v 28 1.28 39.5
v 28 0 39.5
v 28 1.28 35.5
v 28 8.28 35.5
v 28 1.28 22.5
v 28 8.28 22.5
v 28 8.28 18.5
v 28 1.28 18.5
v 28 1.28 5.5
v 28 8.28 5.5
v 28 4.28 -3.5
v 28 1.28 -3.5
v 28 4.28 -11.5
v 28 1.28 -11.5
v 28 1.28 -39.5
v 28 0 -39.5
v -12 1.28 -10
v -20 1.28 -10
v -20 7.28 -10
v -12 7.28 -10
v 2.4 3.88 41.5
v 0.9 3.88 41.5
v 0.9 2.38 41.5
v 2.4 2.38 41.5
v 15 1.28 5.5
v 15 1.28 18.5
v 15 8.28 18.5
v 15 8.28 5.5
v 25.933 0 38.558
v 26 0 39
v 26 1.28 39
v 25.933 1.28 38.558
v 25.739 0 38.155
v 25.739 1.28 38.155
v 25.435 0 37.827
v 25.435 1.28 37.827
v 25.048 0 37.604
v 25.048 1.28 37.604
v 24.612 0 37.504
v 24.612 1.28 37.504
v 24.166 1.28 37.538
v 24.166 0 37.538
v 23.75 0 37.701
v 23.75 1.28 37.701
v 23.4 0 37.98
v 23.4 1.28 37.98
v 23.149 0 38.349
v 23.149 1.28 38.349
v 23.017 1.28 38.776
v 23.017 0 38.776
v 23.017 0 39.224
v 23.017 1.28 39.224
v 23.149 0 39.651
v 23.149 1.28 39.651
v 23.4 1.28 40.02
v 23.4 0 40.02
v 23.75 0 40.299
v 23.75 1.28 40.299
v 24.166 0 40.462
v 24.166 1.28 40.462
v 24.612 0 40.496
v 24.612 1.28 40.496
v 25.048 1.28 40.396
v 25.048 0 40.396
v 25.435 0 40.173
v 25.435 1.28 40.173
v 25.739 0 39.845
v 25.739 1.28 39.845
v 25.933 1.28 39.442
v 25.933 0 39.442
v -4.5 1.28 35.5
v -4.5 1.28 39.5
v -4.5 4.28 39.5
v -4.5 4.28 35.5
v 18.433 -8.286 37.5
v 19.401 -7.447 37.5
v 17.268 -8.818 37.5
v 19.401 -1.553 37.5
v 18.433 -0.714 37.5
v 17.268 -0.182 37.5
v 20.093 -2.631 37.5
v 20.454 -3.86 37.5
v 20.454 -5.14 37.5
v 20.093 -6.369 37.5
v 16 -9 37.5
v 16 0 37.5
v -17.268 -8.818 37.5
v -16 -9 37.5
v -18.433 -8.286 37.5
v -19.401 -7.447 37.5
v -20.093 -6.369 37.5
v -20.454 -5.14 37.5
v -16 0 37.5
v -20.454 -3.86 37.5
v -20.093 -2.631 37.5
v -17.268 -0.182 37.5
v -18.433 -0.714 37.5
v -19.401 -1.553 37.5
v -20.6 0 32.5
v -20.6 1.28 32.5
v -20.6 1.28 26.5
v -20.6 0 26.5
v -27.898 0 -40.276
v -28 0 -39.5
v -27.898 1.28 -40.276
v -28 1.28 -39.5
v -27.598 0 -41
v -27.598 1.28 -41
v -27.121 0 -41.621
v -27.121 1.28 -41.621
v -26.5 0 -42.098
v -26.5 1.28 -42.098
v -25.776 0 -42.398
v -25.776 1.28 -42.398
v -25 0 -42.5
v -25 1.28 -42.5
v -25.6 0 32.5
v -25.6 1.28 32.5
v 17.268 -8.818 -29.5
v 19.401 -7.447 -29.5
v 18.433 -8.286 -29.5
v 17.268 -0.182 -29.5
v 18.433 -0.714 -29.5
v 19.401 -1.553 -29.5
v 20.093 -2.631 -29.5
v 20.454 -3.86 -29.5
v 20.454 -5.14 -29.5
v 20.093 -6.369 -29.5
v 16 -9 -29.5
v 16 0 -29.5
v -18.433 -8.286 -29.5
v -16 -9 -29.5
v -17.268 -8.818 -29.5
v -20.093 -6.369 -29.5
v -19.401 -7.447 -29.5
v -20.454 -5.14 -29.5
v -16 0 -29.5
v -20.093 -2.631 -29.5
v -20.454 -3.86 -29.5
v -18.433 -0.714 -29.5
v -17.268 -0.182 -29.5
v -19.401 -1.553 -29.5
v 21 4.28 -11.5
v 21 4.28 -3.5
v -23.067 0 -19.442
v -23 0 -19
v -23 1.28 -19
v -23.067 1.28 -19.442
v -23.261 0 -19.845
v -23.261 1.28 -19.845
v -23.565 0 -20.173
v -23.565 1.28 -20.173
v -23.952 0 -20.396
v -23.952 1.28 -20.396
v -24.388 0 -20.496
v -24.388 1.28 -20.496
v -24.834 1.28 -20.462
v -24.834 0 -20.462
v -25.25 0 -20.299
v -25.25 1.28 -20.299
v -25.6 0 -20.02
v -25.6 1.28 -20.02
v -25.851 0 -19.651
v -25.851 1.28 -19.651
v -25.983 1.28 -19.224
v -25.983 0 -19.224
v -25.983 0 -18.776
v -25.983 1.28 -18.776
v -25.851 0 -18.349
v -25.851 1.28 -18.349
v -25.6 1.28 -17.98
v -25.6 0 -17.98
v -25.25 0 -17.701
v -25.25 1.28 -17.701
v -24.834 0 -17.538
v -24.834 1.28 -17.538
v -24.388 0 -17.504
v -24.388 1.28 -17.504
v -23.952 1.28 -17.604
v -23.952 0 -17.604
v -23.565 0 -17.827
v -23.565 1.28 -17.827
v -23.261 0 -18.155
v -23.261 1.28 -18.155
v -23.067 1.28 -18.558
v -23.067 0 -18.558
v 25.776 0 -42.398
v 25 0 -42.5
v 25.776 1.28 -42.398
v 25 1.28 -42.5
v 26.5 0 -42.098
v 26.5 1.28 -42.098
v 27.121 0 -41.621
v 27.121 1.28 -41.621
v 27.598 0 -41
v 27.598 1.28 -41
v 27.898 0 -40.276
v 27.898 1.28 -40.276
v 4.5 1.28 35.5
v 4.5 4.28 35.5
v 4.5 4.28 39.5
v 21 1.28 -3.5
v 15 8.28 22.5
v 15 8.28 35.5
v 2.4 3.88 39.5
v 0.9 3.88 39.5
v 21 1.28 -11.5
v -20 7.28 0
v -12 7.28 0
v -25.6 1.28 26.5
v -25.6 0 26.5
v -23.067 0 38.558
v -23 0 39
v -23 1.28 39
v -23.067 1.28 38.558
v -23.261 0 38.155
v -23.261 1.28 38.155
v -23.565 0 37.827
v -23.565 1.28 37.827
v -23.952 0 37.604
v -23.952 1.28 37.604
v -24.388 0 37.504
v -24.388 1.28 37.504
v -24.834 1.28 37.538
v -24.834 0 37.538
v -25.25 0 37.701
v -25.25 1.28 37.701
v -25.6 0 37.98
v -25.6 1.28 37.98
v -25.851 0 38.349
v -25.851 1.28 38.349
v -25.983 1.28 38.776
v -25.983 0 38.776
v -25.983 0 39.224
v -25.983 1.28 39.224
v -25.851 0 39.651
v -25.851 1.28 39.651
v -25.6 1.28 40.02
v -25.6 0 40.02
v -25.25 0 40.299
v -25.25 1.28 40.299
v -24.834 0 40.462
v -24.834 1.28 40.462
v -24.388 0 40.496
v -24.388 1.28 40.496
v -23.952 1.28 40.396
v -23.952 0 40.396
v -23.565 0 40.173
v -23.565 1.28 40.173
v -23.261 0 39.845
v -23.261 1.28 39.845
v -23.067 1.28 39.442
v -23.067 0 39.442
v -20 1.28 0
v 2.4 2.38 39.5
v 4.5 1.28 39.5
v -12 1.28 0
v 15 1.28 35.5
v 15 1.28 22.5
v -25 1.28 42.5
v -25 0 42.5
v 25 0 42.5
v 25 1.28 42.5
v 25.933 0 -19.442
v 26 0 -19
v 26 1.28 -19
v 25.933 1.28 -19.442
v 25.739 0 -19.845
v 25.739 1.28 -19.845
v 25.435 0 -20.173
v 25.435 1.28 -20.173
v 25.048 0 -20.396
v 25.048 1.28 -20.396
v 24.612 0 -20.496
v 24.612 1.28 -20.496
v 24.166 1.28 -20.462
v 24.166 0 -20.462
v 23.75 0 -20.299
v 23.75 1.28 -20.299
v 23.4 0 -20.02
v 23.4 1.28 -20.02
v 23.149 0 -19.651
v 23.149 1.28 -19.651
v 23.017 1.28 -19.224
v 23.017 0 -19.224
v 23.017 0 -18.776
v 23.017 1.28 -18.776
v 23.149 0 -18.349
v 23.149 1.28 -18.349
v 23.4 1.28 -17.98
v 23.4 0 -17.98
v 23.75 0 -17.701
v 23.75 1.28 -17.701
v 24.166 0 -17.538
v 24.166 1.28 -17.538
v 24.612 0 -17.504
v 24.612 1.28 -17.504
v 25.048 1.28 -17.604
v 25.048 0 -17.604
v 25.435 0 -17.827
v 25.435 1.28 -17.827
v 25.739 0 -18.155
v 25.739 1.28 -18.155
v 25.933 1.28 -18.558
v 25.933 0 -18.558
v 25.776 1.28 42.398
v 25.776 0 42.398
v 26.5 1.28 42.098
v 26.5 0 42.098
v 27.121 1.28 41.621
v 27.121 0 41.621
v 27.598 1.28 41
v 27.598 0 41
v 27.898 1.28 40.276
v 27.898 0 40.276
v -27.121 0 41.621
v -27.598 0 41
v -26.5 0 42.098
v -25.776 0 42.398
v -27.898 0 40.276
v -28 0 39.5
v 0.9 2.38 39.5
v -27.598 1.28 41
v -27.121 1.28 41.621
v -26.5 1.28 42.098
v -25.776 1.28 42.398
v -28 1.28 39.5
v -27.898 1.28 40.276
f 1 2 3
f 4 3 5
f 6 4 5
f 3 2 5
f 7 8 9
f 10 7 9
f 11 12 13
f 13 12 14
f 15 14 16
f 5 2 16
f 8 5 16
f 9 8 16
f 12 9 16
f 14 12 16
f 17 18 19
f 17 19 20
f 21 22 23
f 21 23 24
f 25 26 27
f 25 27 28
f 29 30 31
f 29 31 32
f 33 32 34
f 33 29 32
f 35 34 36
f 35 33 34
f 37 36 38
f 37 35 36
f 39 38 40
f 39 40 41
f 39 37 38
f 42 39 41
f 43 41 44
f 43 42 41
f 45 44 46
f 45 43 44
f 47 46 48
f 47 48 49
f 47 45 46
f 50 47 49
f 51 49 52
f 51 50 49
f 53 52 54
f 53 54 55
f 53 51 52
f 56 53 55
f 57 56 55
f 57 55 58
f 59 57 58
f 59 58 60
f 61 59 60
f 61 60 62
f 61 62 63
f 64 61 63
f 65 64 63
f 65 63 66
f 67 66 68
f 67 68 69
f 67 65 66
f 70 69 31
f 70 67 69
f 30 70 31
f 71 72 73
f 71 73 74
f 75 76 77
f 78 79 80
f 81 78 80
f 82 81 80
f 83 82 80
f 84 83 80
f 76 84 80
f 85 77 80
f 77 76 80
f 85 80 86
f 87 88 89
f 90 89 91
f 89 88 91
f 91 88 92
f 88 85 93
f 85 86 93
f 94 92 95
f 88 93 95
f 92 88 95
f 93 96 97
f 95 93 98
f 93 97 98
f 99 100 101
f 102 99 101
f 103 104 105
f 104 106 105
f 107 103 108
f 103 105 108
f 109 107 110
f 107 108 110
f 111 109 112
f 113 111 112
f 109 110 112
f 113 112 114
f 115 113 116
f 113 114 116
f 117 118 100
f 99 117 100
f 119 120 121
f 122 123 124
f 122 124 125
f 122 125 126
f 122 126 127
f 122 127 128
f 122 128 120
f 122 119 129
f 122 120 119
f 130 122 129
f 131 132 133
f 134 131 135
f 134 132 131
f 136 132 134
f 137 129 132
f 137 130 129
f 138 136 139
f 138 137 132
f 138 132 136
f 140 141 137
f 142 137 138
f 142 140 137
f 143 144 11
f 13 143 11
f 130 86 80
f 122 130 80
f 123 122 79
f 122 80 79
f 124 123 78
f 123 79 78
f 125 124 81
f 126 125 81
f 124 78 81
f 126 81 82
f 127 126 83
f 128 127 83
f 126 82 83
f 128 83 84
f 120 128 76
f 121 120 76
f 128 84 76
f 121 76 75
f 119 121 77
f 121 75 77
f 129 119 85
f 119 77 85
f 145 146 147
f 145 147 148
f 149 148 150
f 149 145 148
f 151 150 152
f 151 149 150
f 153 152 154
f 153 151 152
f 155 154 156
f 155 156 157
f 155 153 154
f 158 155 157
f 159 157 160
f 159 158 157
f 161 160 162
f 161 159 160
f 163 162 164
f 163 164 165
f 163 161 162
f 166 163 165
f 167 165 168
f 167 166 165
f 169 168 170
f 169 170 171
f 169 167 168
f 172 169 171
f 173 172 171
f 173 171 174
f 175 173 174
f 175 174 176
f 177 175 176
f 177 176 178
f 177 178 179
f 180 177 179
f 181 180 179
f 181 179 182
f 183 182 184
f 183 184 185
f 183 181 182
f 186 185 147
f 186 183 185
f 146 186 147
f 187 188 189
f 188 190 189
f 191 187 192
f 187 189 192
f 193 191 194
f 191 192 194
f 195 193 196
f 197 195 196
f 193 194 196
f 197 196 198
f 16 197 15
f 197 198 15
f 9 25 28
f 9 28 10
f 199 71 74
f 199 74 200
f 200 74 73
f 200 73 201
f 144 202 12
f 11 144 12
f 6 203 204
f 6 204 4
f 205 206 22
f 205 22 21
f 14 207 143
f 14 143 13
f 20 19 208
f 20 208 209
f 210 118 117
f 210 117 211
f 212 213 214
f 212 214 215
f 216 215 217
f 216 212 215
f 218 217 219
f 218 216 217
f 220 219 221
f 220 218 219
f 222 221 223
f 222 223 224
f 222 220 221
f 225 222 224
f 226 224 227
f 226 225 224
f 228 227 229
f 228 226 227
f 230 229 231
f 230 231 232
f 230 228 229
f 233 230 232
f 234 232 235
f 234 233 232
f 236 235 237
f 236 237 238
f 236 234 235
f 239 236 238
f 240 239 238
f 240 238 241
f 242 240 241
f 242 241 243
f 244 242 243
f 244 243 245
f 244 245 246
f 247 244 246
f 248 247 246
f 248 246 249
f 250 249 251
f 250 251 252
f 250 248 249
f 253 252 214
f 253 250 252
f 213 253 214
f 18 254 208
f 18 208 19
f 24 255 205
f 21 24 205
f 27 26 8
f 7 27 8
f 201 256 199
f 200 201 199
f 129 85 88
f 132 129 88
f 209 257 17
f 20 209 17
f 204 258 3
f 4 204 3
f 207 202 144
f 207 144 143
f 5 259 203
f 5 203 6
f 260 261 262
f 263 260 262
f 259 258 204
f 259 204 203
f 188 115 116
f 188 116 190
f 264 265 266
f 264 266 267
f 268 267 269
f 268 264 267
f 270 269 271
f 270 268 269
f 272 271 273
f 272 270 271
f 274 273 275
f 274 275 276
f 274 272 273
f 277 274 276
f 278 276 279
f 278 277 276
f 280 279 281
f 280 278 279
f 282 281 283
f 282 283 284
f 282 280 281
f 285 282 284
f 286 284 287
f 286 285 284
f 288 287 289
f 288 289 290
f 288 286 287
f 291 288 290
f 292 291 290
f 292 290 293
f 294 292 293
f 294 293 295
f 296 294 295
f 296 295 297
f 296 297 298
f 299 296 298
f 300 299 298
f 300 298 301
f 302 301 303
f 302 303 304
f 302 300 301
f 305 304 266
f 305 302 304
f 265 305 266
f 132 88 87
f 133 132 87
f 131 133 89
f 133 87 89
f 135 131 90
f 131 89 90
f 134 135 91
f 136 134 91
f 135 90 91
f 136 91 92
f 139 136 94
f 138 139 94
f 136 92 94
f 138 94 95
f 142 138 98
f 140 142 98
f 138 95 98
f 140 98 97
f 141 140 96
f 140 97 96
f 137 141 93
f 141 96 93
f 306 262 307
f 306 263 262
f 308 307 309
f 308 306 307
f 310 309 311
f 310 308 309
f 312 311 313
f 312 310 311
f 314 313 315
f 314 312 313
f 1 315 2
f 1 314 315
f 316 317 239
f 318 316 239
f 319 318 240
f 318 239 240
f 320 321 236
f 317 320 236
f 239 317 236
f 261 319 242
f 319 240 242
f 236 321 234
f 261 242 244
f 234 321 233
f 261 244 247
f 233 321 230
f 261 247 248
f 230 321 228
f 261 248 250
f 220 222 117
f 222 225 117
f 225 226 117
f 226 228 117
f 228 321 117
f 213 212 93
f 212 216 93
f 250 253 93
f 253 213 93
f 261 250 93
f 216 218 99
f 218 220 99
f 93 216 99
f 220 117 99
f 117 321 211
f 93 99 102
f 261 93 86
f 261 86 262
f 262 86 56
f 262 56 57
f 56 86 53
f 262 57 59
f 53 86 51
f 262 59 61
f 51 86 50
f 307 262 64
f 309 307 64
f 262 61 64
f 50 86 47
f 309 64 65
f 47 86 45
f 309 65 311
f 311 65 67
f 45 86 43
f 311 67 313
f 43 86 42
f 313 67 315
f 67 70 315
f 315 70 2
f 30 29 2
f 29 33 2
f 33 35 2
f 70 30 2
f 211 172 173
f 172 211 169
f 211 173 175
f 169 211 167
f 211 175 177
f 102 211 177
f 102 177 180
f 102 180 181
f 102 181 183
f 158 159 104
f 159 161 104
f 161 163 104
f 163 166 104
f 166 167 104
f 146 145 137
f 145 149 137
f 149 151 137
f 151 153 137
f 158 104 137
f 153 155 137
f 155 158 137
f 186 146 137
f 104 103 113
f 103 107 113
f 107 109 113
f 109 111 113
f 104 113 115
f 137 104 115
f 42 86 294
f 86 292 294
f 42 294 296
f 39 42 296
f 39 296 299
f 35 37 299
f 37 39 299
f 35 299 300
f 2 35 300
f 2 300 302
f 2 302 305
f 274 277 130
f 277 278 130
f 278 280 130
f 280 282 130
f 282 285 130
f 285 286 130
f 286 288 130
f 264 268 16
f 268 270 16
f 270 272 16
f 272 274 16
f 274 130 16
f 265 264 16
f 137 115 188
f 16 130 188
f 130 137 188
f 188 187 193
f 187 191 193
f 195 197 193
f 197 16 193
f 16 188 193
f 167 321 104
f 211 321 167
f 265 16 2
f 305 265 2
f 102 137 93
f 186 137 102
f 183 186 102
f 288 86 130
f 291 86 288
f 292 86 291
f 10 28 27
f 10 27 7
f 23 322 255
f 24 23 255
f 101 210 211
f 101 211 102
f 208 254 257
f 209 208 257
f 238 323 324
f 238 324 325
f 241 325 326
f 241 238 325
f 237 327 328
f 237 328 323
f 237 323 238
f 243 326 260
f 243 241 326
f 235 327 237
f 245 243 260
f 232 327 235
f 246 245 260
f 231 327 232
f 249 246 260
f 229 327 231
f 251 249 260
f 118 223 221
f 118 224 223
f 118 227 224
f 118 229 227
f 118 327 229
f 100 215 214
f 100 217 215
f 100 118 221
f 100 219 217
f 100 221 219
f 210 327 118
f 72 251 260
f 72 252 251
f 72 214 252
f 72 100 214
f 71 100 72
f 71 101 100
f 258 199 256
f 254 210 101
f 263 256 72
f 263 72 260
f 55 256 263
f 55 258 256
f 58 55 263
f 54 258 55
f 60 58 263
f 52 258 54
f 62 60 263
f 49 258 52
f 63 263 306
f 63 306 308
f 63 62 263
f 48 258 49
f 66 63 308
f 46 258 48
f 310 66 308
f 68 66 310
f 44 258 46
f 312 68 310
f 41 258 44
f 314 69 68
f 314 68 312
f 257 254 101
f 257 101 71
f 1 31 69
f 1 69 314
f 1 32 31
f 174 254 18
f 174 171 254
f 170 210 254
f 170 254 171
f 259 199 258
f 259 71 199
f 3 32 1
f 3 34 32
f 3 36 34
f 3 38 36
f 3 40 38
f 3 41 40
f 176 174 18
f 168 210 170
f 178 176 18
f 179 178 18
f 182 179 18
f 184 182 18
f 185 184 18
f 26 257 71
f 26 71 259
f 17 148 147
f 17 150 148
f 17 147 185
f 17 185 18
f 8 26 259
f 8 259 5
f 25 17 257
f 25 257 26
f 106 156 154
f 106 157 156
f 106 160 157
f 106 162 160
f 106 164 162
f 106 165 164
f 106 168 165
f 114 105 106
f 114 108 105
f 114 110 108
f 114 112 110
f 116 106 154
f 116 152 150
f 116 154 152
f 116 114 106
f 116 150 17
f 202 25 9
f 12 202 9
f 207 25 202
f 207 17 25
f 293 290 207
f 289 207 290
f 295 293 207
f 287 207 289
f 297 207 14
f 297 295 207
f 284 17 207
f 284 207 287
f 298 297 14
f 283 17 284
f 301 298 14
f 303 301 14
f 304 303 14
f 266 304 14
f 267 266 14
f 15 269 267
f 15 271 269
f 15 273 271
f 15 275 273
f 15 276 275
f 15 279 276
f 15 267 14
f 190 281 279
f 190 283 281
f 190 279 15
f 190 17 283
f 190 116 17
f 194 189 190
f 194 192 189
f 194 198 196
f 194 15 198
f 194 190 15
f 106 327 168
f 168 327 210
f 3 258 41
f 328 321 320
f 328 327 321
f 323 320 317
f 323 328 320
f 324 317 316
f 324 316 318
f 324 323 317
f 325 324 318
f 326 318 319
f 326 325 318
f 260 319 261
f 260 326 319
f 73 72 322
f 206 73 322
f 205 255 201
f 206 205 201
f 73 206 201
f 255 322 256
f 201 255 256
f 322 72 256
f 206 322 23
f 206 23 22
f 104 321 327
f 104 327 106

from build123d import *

# Parameters (mm, degrees)
SKETCH_1_W          = 56
SKETCH_1_H          = 85
SKETCH_1_R          = 1.5
EXTRUDE_1_DEPTH     = 1.28
FILLET_1_R          = 3
SKETCH_6_W          = 5
SKETCH_6_H          = 6
CUT_EXTRUDE_1_DEPTH = 2.28
SKETCH_4_W          = 8
SKETCH_4_H          = 10
EXTRUDE_2_DEPTH     = 6
SKETCH_5_W          = 9
SKETCH_5_H          = 4
EXTRUDE_3_DEPTH     = 3
SKETCH_2_W          = 13
SKETCH_2_H          = 13
EXTRUDE_4_DEPTH     = 7
SKETCH_3_W          = 7
SKETCH_3_H          = 8
EXTRUDE_5_DEPTH     = 3
SKETCH_7_W          = 1.5
SKETCH_7_H          = 1.5
EXTRUDE_6_DEPTH     = 2
EXTRUDE_START       = 37.5
EXTRUDE_8_DEPTH     = 67


with BuildPart() as part:
    # 草圖1 → 填料-伸長1 (new body)
    with BuildSketch(Plane(origin=(0, 0, 0), x_dir=(1, 0, 0), z_dir=(0, 1, 0))):
        Rectangle(SKETCH_1_W, SKETCH_1_H)
        with Locations((-24.5, 19)):
            Circle(SKETCH_1_R, mode=Mode.SUBTRACT)
        with Locations((-24.5, -39)):
            Circle(SKETCH_1_R, mode=Mode.SUBTRACT)
        with Locations((24.5, -39)):
            Circle(SKETCH_1_R, mode=Mode.SUBTRACT)
        with Locations((24.5, 19)):
            Circle(SKETCH_1_R, mode=Mode.SUBTRACT)
    extrude(amount=EXTRUDE_1_DEPTH)

    # 圓角1
    fillet_1_edges = [part.edges().sort_by_distance(p)[0] for p in [
        (28, 0.64, 42.5),
        (-28, 0.64, 42.5),
        (-28, 0.64, -42.5),
        (28, 0.64, -42.5),
    ]]
    fillet(fillet_1_edges, radius=FILLET_1_R)

    # 草圖6 → 除料-伸長1 (cut, through all)
    with BuildSketch(Plane(origin=(0, 1.28, 0), x_dir=(1, 0, 0), z_dir=(0, 1, 0))):
        with Locations((-23.1, -29.5)):
            Rectangle(SKETCH_6_W, SKETCH_6_H)
    extrude(amount=-CUT_EXTRUDE_1_DEPTH, mode=Mode.SUBTRACT)

    # 草圖4 → 填料-伸長2 (add)
    with BuildSketch(Plane(origin=(0, 1.28, 0), x_dir=(1, 0, 0), z_dir=(0, 1, 0))):
        with Locations((-16, 5)):
            Rectangle(SKETCH_4_W, SKETCH_4_H)
    extrude(amount=EXTRUDE_2_DEPTH)

    # 草圖5 → 填料-伸長3 (add)
    with BuildSketch(Plane(origin=(0, 1.28, 0), x_dir=(1, 0, 0), z_dir=(0, 1, 0))):
        with Locations((0, -37.5)):
            Rectangle(SKETCH_5_W, SKETCH_5_H)
    extrude(amount=EXTRUDE_3_DEPTH)

    # 草圖2 → 填料-伸長4 (add)
    with BuildSketch(Plane(origin=(0, 1.28, 0), x_dir=(1, 0, 0), z_dir=(0, 1, 0))):
        with Locations((21.5, -12)):
            Rectangle(SKETCH_2_W, SKETCH_2_H)
        with Locations((21.5, -29)):
            Rectangle(SKETCH_2_W, SKETCH_2_H)
    extrude(amount=EXTRUDE_4_DEPTH)

    # 草圖3 → 填料-伸長5 (add)
    with BuildSketch(Plane(origin=(0, 1.28, 0), x_dir=(1, 0, 0), z_dir=(0, 1, 0))):
        with Locations((24.5, 7.5)):
            Rectangle(SKETCH_3_W, SKETCH_3_H)
    extrude(amount=EXTRUDE_5_DEPTH)

    # 草圖7 → 填料-伸長6 (add)
    with BuildSketch(Plane.XY.offset(39.5)):
        with Locations((1.65, 3.13)):
            Rectangle(SKETCH_7_W, SKETCH_7_H)
    extrude(amount=EXTRUDE_6_DEPTH)

    # 草圖9 → 填料-伸長8 (add)
    with BuildSketch(Plane.XY.offset(EXTRUDE_START)):
        with BuildLine():
            Line((-16, 0), (16, 0))
            ThreePointArc((16, 0), (20.5, -4.5), (16, -9))
            Line((16, -9), (-16, -9))
            ThreePointArc((-16, -9), (-20.5, -4.5), (-16, 0))
        make_face()
    extrude(amount=-EXTRUDE_8_DEPTH)


solid = part.part
